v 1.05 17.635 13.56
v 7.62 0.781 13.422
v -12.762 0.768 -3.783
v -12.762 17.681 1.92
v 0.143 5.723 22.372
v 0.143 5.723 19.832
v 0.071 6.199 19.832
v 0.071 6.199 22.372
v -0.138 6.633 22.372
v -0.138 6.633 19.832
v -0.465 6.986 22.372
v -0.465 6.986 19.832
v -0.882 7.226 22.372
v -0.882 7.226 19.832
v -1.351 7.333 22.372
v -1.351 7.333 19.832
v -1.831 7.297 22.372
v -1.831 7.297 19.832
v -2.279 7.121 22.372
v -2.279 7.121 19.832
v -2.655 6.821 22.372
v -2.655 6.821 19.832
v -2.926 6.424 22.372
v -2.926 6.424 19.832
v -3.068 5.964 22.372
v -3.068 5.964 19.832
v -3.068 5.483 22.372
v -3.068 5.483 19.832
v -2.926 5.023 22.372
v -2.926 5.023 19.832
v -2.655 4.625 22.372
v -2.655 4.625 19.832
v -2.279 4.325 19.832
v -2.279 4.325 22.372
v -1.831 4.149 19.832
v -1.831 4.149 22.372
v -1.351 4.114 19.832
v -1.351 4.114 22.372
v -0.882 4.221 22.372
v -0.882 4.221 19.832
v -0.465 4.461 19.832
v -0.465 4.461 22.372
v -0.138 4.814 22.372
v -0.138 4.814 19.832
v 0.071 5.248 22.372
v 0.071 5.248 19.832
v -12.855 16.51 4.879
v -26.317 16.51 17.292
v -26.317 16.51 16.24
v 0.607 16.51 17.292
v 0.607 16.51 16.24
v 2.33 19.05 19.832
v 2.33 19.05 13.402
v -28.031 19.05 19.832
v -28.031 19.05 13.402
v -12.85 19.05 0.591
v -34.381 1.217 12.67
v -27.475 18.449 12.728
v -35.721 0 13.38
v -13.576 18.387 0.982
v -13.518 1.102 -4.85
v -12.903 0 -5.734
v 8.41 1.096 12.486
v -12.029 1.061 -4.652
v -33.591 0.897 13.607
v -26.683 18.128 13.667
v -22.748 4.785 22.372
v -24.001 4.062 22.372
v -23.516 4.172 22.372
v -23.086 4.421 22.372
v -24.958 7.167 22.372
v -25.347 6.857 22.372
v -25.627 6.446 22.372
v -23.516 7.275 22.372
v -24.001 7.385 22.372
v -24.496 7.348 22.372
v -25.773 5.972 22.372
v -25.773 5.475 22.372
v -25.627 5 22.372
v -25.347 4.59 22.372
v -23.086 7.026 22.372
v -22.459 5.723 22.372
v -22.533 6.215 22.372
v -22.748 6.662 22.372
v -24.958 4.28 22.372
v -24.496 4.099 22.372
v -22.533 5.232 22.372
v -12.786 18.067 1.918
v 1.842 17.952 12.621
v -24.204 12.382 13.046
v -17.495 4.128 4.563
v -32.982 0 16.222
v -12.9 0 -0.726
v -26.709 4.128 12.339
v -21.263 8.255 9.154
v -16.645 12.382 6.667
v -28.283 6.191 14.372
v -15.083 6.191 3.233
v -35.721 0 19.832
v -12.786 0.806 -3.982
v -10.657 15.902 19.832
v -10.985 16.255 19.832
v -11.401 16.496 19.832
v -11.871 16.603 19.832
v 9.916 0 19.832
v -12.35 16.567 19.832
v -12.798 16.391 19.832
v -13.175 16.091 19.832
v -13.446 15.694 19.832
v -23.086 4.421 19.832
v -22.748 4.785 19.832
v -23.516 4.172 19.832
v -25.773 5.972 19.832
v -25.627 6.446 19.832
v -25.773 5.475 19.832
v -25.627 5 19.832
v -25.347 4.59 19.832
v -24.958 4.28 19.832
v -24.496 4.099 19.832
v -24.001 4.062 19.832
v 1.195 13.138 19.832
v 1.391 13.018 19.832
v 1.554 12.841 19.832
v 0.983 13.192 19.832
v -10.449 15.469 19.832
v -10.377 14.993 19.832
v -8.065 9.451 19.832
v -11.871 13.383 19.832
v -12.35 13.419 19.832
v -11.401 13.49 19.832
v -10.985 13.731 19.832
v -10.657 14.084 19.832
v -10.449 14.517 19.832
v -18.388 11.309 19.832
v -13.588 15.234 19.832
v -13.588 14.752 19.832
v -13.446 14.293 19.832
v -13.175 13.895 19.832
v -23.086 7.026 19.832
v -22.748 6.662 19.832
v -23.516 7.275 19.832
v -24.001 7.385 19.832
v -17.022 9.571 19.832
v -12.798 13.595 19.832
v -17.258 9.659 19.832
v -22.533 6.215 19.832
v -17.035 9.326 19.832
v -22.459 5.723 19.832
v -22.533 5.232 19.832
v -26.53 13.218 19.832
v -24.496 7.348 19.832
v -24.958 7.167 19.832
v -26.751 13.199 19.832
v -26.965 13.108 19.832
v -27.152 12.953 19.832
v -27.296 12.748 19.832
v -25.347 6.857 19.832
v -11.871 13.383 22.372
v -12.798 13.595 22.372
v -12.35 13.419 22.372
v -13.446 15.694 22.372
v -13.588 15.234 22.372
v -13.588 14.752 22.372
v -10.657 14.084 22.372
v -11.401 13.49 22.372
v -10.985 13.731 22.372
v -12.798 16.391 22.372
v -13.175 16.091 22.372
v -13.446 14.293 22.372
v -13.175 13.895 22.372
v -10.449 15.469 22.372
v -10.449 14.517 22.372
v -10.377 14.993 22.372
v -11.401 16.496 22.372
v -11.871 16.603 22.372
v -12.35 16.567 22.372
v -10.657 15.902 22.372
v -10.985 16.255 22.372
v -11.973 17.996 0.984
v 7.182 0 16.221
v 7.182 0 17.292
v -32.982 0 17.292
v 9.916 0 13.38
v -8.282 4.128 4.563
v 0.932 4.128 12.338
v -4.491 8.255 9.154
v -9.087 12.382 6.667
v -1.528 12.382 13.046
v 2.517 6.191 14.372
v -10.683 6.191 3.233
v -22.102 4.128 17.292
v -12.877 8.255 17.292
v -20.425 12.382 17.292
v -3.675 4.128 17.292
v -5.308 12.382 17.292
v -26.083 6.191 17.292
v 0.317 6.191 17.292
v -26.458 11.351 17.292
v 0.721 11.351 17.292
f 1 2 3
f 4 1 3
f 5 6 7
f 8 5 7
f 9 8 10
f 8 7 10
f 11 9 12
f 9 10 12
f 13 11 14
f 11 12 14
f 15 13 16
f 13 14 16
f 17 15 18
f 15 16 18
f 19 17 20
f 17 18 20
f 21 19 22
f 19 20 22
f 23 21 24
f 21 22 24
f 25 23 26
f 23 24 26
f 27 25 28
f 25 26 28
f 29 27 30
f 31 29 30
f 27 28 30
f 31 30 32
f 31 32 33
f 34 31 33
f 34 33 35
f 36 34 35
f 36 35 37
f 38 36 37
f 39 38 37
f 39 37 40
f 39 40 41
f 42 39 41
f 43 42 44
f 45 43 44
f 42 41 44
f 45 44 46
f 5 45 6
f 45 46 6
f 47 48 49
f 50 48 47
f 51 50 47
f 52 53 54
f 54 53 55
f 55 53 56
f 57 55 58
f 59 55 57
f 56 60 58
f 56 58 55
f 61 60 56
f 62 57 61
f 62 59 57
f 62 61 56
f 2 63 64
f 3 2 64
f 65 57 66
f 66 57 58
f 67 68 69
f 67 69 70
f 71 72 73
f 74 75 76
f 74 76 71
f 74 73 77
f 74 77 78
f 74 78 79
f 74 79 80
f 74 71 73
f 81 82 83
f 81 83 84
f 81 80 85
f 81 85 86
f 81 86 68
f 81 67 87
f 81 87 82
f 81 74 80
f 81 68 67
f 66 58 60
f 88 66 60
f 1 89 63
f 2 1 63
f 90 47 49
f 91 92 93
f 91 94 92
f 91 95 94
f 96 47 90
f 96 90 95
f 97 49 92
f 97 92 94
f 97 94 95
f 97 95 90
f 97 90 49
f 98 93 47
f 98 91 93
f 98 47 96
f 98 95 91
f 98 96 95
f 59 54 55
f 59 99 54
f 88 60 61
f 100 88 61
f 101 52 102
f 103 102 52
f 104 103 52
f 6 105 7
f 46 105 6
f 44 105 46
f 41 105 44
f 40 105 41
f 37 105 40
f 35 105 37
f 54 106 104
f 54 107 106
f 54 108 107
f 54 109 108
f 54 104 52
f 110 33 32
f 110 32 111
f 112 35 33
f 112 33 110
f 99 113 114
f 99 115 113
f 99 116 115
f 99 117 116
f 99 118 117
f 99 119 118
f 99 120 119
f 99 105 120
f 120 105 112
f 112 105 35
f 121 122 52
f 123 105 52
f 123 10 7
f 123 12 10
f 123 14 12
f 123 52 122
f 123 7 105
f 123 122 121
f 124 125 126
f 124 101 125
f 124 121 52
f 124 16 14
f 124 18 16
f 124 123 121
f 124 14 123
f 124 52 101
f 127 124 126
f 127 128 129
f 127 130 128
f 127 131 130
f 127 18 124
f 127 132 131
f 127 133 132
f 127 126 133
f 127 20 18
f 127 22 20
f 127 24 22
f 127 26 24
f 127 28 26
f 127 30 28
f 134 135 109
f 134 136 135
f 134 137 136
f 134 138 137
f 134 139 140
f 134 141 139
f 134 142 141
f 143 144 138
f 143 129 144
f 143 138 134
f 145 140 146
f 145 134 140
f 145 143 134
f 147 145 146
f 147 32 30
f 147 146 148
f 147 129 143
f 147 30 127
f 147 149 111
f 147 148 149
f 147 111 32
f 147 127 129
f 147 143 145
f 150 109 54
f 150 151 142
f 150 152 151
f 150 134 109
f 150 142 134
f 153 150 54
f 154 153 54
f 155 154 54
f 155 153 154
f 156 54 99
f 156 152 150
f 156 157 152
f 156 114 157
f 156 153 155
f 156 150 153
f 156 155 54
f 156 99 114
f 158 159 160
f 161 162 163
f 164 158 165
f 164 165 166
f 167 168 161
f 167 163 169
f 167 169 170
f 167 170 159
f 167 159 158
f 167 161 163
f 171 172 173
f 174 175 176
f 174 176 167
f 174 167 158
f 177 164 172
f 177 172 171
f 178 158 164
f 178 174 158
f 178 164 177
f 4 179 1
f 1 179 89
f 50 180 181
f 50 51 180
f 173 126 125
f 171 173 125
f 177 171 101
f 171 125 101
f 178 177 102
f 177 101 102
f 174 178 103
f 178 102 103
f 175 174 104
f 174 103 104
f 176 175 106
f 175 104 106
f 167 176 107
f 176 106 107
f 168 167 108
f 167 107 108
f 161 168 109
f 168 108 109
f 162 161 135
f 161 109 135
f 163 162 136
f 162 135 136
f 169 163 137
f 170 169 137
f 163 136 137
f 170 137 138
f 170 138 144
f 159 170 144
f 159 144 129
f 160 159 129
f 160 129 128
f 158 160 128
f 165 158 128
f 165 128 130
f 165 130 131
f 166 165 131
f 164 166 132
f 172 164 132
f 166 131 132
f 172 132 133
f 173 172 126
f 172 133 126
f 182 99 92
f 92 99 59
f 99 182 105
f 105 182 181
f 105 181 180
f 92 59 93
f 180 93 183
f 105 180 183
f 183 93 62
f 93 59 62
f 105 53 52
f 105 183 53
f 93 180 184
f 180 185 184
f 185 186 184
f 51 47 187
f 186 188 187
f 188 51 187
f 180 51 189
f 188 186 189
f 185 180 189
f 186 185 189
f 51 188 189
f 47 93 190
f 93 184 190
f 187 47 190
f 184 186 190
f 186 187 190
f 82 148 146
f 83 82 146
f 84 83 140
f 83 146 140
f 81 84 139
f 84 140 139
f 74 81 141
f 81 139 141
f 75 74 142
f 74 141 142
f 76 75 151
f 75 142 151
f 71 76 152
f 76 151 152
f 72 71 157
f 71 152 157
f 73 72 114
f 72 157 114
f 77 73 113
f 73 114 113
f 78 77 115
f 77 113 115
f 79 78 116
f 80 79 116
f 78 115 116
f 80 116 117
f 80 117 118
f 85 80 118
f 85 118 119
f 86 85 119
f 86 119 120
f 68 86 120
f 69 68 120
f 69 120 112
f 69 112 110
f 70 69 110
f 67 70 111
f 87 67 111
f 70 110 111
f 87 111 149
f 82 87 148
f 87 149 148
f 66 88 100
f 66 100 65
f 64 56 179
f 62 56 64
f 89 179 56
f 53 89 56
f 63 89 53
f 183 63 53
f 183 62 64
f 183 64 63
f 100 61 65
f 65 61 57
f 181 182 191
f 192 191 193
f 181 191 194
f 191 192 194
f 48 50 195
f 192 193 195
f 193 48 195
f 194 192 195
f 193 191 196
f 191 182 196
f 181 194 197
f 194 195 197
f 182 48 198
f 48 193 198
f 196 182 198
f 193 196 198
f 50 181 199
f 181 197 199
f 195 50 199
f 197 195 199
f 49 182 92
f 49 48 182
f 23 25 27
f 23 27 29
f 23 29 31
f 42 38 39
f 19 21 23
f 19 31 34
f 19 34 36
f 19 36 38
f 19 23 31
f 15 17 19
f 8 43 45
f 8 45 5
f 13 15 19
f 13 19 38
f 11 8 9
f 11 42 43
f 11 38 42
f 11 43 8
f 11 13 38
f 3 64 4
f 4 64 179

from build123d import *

# Parameters (mm, degrees)
SKETCH8_R           = 1.614382249
SKETCH8_R_2         = 1.666459096
BOSS_EXTRUDE1_DEPTH = 2.54
CUT_EXTRUDE1_DEPTH  = 1.27
CUT_EXTRUDE3_DEPTH  = 1.27


with BuildPart() as part:
    # Sketch7 → Loft1 section 0
    with BuildSketch(Plane(origin=(0, 19.05, 0), x_dir=(1, 0, 0), z_dir=(0, 1, 0))):
        with BuildLine():
            Line((2.329927564, -19.831697395), (-28.030874095, -19.831697395))
            Line((-28.030874095, -19.831697395), (-28.030874095, -13.401990643))
            Line((-28.030874095, -13.401990643), (-12.850473266, -0.591086342))
            Line((-12.850473266, -0.591086342), (2.329927564, -13.401990643))
            Line((2.329927564, -13.401990643), (2.329927564, -19.831697395))
        make_face()
    # Sketch1 → Loft1 section 1
    with BuildSketch(Plane(origin=(0, 0, 0), x_dir=(1, 0, 0), z_dir=(0, 1, 0))):
        with BuildLine():
            Line((-35.720948922, -19.831697395), (9.915848697, -19.831697395))
            Line((9.915848697, -19.831697395), (9.915848697, -13.380422339))
            Line((9.915848697, -13.380422339), (-12.902550112, 5.734466717))
            Line((-12.902550112, 5.734466717), (-35.720948922, -13.380422339))
            Line((-35.720948922, -13.380422339), (-35.720948922, -19.831697395))
        make_face()
    loft()

    # Sketch8 → Boss-Extrude1 (add)
    with BuildSketch(Plane.XY.offset(19.831697395)):
        with Locations((-11.991205294, 14.993068909)):
            Circle(SKETCH8_R)
        with Locations((-1.47168225, 5.723390187)):
            Circle(SKETCH8_R)
        with Locations((-24.125110588, 5.723390187)):
            Circle(SKETCH8_R_2)
    extrude(amount=BOSS_EXTRUDE1_DEPTH)

    # Sketch10 → Cut-Extrude1 (cut)
    with BuildSketch(Plane(origin=(-2.316668622, -0.925631174, 2.745158144), x_dir=(-0.7809926786782739, 0.19954822136443426, -0.5918031287524808), z_dir=(0.6245401795328581, 0.2495367072226862, -0.7400547249342612))):
        Polygon((-5.325710862, 21.043562966), (-13.739013708, 5.028281727), (12.35928027, -0.480841902), (12.35928027, 17.367594826), align=None)
    extrude(amount=-CUT_EXTRUDE1_DEPTH, mode=Mode.SUBTRACT)

    # Sketch14 → Cut-Extrude3 (cut)
    with BuildSketch(Plane(origin=(-7.735349681, 3.132971893, -9.166074927), x_dir=(-0.7814202870497631, -0.2018218164714577, 0.5904661627758421), z_dir=(-0.6240050760907847, 0.25273458150056255, -0.7394206491075764))):
        Polygon((34.101698791, 5.249617187), (25.261874217, 21.574256729), (7.477459861, 17.716608027), (7.477459861, -0.525493463), align=None)
    extrude(amount=-CUT_EXTRUDE3_DEPTH, mode=Mode.SUBTRACT)

    # Shell1: read off the stored shape, not the designer's step
    # Shell1: loft between two sections, ruled curve by curve
    shell1_from = [
        Edge.make_line((-32.981801445, 0, 17.291697395), (-32.981801445, 0, 16.221508901)),
        Edge.make_line((7.181869263, 0, 16.221455471), (7.181869263, 0, 17.291697395)),
        Edge.make_line((-32.981801445, 0, 17.291697395), (7.181869263, 0, 17.291697395)),
        Edge.make_line((7.181869263, 0, 16.221455471), (-12.899934435, 0, -0.725795677)),
        Edge.make_line((-32.981801445, 0, 16.221508901), (-12.899934435, 0, -0.725795677)),
    ]
    shell1_to = [
        Edge.make_line((-26.317069927, 16.51, 17.291697395), (-26.317069927, 16.51, 16.240201431)),
        Edge.make_line((0.607404281, 16.51, 16.240148002), (0.607404281, 16.51, 17.291697395)),
        Edge.make_line((-26.317069927, 16.51, 17.291697395), (0.607404281, 16.51, 17.291697395)),
        Edge.make_line((0.607404281, 16.51, 16.240148002), (-12.854801168, 16.51, 4.879247349)),
        Edge.make_line((-26.317069927, 16.51, 16.240201431), (-12.854801168, 16.51, 4.879247349)),
    ]
    shell1 = Solid(Shell([*[Face.make_surface_from_curves(shell1_from[k], shell1_to[k]) for k in range(5)], Face(Wire(shell1_from)), Face(Wire(shell1_to))]))
    add(shell1, mode=Mode.SUBTRACT)


solid = part.part
